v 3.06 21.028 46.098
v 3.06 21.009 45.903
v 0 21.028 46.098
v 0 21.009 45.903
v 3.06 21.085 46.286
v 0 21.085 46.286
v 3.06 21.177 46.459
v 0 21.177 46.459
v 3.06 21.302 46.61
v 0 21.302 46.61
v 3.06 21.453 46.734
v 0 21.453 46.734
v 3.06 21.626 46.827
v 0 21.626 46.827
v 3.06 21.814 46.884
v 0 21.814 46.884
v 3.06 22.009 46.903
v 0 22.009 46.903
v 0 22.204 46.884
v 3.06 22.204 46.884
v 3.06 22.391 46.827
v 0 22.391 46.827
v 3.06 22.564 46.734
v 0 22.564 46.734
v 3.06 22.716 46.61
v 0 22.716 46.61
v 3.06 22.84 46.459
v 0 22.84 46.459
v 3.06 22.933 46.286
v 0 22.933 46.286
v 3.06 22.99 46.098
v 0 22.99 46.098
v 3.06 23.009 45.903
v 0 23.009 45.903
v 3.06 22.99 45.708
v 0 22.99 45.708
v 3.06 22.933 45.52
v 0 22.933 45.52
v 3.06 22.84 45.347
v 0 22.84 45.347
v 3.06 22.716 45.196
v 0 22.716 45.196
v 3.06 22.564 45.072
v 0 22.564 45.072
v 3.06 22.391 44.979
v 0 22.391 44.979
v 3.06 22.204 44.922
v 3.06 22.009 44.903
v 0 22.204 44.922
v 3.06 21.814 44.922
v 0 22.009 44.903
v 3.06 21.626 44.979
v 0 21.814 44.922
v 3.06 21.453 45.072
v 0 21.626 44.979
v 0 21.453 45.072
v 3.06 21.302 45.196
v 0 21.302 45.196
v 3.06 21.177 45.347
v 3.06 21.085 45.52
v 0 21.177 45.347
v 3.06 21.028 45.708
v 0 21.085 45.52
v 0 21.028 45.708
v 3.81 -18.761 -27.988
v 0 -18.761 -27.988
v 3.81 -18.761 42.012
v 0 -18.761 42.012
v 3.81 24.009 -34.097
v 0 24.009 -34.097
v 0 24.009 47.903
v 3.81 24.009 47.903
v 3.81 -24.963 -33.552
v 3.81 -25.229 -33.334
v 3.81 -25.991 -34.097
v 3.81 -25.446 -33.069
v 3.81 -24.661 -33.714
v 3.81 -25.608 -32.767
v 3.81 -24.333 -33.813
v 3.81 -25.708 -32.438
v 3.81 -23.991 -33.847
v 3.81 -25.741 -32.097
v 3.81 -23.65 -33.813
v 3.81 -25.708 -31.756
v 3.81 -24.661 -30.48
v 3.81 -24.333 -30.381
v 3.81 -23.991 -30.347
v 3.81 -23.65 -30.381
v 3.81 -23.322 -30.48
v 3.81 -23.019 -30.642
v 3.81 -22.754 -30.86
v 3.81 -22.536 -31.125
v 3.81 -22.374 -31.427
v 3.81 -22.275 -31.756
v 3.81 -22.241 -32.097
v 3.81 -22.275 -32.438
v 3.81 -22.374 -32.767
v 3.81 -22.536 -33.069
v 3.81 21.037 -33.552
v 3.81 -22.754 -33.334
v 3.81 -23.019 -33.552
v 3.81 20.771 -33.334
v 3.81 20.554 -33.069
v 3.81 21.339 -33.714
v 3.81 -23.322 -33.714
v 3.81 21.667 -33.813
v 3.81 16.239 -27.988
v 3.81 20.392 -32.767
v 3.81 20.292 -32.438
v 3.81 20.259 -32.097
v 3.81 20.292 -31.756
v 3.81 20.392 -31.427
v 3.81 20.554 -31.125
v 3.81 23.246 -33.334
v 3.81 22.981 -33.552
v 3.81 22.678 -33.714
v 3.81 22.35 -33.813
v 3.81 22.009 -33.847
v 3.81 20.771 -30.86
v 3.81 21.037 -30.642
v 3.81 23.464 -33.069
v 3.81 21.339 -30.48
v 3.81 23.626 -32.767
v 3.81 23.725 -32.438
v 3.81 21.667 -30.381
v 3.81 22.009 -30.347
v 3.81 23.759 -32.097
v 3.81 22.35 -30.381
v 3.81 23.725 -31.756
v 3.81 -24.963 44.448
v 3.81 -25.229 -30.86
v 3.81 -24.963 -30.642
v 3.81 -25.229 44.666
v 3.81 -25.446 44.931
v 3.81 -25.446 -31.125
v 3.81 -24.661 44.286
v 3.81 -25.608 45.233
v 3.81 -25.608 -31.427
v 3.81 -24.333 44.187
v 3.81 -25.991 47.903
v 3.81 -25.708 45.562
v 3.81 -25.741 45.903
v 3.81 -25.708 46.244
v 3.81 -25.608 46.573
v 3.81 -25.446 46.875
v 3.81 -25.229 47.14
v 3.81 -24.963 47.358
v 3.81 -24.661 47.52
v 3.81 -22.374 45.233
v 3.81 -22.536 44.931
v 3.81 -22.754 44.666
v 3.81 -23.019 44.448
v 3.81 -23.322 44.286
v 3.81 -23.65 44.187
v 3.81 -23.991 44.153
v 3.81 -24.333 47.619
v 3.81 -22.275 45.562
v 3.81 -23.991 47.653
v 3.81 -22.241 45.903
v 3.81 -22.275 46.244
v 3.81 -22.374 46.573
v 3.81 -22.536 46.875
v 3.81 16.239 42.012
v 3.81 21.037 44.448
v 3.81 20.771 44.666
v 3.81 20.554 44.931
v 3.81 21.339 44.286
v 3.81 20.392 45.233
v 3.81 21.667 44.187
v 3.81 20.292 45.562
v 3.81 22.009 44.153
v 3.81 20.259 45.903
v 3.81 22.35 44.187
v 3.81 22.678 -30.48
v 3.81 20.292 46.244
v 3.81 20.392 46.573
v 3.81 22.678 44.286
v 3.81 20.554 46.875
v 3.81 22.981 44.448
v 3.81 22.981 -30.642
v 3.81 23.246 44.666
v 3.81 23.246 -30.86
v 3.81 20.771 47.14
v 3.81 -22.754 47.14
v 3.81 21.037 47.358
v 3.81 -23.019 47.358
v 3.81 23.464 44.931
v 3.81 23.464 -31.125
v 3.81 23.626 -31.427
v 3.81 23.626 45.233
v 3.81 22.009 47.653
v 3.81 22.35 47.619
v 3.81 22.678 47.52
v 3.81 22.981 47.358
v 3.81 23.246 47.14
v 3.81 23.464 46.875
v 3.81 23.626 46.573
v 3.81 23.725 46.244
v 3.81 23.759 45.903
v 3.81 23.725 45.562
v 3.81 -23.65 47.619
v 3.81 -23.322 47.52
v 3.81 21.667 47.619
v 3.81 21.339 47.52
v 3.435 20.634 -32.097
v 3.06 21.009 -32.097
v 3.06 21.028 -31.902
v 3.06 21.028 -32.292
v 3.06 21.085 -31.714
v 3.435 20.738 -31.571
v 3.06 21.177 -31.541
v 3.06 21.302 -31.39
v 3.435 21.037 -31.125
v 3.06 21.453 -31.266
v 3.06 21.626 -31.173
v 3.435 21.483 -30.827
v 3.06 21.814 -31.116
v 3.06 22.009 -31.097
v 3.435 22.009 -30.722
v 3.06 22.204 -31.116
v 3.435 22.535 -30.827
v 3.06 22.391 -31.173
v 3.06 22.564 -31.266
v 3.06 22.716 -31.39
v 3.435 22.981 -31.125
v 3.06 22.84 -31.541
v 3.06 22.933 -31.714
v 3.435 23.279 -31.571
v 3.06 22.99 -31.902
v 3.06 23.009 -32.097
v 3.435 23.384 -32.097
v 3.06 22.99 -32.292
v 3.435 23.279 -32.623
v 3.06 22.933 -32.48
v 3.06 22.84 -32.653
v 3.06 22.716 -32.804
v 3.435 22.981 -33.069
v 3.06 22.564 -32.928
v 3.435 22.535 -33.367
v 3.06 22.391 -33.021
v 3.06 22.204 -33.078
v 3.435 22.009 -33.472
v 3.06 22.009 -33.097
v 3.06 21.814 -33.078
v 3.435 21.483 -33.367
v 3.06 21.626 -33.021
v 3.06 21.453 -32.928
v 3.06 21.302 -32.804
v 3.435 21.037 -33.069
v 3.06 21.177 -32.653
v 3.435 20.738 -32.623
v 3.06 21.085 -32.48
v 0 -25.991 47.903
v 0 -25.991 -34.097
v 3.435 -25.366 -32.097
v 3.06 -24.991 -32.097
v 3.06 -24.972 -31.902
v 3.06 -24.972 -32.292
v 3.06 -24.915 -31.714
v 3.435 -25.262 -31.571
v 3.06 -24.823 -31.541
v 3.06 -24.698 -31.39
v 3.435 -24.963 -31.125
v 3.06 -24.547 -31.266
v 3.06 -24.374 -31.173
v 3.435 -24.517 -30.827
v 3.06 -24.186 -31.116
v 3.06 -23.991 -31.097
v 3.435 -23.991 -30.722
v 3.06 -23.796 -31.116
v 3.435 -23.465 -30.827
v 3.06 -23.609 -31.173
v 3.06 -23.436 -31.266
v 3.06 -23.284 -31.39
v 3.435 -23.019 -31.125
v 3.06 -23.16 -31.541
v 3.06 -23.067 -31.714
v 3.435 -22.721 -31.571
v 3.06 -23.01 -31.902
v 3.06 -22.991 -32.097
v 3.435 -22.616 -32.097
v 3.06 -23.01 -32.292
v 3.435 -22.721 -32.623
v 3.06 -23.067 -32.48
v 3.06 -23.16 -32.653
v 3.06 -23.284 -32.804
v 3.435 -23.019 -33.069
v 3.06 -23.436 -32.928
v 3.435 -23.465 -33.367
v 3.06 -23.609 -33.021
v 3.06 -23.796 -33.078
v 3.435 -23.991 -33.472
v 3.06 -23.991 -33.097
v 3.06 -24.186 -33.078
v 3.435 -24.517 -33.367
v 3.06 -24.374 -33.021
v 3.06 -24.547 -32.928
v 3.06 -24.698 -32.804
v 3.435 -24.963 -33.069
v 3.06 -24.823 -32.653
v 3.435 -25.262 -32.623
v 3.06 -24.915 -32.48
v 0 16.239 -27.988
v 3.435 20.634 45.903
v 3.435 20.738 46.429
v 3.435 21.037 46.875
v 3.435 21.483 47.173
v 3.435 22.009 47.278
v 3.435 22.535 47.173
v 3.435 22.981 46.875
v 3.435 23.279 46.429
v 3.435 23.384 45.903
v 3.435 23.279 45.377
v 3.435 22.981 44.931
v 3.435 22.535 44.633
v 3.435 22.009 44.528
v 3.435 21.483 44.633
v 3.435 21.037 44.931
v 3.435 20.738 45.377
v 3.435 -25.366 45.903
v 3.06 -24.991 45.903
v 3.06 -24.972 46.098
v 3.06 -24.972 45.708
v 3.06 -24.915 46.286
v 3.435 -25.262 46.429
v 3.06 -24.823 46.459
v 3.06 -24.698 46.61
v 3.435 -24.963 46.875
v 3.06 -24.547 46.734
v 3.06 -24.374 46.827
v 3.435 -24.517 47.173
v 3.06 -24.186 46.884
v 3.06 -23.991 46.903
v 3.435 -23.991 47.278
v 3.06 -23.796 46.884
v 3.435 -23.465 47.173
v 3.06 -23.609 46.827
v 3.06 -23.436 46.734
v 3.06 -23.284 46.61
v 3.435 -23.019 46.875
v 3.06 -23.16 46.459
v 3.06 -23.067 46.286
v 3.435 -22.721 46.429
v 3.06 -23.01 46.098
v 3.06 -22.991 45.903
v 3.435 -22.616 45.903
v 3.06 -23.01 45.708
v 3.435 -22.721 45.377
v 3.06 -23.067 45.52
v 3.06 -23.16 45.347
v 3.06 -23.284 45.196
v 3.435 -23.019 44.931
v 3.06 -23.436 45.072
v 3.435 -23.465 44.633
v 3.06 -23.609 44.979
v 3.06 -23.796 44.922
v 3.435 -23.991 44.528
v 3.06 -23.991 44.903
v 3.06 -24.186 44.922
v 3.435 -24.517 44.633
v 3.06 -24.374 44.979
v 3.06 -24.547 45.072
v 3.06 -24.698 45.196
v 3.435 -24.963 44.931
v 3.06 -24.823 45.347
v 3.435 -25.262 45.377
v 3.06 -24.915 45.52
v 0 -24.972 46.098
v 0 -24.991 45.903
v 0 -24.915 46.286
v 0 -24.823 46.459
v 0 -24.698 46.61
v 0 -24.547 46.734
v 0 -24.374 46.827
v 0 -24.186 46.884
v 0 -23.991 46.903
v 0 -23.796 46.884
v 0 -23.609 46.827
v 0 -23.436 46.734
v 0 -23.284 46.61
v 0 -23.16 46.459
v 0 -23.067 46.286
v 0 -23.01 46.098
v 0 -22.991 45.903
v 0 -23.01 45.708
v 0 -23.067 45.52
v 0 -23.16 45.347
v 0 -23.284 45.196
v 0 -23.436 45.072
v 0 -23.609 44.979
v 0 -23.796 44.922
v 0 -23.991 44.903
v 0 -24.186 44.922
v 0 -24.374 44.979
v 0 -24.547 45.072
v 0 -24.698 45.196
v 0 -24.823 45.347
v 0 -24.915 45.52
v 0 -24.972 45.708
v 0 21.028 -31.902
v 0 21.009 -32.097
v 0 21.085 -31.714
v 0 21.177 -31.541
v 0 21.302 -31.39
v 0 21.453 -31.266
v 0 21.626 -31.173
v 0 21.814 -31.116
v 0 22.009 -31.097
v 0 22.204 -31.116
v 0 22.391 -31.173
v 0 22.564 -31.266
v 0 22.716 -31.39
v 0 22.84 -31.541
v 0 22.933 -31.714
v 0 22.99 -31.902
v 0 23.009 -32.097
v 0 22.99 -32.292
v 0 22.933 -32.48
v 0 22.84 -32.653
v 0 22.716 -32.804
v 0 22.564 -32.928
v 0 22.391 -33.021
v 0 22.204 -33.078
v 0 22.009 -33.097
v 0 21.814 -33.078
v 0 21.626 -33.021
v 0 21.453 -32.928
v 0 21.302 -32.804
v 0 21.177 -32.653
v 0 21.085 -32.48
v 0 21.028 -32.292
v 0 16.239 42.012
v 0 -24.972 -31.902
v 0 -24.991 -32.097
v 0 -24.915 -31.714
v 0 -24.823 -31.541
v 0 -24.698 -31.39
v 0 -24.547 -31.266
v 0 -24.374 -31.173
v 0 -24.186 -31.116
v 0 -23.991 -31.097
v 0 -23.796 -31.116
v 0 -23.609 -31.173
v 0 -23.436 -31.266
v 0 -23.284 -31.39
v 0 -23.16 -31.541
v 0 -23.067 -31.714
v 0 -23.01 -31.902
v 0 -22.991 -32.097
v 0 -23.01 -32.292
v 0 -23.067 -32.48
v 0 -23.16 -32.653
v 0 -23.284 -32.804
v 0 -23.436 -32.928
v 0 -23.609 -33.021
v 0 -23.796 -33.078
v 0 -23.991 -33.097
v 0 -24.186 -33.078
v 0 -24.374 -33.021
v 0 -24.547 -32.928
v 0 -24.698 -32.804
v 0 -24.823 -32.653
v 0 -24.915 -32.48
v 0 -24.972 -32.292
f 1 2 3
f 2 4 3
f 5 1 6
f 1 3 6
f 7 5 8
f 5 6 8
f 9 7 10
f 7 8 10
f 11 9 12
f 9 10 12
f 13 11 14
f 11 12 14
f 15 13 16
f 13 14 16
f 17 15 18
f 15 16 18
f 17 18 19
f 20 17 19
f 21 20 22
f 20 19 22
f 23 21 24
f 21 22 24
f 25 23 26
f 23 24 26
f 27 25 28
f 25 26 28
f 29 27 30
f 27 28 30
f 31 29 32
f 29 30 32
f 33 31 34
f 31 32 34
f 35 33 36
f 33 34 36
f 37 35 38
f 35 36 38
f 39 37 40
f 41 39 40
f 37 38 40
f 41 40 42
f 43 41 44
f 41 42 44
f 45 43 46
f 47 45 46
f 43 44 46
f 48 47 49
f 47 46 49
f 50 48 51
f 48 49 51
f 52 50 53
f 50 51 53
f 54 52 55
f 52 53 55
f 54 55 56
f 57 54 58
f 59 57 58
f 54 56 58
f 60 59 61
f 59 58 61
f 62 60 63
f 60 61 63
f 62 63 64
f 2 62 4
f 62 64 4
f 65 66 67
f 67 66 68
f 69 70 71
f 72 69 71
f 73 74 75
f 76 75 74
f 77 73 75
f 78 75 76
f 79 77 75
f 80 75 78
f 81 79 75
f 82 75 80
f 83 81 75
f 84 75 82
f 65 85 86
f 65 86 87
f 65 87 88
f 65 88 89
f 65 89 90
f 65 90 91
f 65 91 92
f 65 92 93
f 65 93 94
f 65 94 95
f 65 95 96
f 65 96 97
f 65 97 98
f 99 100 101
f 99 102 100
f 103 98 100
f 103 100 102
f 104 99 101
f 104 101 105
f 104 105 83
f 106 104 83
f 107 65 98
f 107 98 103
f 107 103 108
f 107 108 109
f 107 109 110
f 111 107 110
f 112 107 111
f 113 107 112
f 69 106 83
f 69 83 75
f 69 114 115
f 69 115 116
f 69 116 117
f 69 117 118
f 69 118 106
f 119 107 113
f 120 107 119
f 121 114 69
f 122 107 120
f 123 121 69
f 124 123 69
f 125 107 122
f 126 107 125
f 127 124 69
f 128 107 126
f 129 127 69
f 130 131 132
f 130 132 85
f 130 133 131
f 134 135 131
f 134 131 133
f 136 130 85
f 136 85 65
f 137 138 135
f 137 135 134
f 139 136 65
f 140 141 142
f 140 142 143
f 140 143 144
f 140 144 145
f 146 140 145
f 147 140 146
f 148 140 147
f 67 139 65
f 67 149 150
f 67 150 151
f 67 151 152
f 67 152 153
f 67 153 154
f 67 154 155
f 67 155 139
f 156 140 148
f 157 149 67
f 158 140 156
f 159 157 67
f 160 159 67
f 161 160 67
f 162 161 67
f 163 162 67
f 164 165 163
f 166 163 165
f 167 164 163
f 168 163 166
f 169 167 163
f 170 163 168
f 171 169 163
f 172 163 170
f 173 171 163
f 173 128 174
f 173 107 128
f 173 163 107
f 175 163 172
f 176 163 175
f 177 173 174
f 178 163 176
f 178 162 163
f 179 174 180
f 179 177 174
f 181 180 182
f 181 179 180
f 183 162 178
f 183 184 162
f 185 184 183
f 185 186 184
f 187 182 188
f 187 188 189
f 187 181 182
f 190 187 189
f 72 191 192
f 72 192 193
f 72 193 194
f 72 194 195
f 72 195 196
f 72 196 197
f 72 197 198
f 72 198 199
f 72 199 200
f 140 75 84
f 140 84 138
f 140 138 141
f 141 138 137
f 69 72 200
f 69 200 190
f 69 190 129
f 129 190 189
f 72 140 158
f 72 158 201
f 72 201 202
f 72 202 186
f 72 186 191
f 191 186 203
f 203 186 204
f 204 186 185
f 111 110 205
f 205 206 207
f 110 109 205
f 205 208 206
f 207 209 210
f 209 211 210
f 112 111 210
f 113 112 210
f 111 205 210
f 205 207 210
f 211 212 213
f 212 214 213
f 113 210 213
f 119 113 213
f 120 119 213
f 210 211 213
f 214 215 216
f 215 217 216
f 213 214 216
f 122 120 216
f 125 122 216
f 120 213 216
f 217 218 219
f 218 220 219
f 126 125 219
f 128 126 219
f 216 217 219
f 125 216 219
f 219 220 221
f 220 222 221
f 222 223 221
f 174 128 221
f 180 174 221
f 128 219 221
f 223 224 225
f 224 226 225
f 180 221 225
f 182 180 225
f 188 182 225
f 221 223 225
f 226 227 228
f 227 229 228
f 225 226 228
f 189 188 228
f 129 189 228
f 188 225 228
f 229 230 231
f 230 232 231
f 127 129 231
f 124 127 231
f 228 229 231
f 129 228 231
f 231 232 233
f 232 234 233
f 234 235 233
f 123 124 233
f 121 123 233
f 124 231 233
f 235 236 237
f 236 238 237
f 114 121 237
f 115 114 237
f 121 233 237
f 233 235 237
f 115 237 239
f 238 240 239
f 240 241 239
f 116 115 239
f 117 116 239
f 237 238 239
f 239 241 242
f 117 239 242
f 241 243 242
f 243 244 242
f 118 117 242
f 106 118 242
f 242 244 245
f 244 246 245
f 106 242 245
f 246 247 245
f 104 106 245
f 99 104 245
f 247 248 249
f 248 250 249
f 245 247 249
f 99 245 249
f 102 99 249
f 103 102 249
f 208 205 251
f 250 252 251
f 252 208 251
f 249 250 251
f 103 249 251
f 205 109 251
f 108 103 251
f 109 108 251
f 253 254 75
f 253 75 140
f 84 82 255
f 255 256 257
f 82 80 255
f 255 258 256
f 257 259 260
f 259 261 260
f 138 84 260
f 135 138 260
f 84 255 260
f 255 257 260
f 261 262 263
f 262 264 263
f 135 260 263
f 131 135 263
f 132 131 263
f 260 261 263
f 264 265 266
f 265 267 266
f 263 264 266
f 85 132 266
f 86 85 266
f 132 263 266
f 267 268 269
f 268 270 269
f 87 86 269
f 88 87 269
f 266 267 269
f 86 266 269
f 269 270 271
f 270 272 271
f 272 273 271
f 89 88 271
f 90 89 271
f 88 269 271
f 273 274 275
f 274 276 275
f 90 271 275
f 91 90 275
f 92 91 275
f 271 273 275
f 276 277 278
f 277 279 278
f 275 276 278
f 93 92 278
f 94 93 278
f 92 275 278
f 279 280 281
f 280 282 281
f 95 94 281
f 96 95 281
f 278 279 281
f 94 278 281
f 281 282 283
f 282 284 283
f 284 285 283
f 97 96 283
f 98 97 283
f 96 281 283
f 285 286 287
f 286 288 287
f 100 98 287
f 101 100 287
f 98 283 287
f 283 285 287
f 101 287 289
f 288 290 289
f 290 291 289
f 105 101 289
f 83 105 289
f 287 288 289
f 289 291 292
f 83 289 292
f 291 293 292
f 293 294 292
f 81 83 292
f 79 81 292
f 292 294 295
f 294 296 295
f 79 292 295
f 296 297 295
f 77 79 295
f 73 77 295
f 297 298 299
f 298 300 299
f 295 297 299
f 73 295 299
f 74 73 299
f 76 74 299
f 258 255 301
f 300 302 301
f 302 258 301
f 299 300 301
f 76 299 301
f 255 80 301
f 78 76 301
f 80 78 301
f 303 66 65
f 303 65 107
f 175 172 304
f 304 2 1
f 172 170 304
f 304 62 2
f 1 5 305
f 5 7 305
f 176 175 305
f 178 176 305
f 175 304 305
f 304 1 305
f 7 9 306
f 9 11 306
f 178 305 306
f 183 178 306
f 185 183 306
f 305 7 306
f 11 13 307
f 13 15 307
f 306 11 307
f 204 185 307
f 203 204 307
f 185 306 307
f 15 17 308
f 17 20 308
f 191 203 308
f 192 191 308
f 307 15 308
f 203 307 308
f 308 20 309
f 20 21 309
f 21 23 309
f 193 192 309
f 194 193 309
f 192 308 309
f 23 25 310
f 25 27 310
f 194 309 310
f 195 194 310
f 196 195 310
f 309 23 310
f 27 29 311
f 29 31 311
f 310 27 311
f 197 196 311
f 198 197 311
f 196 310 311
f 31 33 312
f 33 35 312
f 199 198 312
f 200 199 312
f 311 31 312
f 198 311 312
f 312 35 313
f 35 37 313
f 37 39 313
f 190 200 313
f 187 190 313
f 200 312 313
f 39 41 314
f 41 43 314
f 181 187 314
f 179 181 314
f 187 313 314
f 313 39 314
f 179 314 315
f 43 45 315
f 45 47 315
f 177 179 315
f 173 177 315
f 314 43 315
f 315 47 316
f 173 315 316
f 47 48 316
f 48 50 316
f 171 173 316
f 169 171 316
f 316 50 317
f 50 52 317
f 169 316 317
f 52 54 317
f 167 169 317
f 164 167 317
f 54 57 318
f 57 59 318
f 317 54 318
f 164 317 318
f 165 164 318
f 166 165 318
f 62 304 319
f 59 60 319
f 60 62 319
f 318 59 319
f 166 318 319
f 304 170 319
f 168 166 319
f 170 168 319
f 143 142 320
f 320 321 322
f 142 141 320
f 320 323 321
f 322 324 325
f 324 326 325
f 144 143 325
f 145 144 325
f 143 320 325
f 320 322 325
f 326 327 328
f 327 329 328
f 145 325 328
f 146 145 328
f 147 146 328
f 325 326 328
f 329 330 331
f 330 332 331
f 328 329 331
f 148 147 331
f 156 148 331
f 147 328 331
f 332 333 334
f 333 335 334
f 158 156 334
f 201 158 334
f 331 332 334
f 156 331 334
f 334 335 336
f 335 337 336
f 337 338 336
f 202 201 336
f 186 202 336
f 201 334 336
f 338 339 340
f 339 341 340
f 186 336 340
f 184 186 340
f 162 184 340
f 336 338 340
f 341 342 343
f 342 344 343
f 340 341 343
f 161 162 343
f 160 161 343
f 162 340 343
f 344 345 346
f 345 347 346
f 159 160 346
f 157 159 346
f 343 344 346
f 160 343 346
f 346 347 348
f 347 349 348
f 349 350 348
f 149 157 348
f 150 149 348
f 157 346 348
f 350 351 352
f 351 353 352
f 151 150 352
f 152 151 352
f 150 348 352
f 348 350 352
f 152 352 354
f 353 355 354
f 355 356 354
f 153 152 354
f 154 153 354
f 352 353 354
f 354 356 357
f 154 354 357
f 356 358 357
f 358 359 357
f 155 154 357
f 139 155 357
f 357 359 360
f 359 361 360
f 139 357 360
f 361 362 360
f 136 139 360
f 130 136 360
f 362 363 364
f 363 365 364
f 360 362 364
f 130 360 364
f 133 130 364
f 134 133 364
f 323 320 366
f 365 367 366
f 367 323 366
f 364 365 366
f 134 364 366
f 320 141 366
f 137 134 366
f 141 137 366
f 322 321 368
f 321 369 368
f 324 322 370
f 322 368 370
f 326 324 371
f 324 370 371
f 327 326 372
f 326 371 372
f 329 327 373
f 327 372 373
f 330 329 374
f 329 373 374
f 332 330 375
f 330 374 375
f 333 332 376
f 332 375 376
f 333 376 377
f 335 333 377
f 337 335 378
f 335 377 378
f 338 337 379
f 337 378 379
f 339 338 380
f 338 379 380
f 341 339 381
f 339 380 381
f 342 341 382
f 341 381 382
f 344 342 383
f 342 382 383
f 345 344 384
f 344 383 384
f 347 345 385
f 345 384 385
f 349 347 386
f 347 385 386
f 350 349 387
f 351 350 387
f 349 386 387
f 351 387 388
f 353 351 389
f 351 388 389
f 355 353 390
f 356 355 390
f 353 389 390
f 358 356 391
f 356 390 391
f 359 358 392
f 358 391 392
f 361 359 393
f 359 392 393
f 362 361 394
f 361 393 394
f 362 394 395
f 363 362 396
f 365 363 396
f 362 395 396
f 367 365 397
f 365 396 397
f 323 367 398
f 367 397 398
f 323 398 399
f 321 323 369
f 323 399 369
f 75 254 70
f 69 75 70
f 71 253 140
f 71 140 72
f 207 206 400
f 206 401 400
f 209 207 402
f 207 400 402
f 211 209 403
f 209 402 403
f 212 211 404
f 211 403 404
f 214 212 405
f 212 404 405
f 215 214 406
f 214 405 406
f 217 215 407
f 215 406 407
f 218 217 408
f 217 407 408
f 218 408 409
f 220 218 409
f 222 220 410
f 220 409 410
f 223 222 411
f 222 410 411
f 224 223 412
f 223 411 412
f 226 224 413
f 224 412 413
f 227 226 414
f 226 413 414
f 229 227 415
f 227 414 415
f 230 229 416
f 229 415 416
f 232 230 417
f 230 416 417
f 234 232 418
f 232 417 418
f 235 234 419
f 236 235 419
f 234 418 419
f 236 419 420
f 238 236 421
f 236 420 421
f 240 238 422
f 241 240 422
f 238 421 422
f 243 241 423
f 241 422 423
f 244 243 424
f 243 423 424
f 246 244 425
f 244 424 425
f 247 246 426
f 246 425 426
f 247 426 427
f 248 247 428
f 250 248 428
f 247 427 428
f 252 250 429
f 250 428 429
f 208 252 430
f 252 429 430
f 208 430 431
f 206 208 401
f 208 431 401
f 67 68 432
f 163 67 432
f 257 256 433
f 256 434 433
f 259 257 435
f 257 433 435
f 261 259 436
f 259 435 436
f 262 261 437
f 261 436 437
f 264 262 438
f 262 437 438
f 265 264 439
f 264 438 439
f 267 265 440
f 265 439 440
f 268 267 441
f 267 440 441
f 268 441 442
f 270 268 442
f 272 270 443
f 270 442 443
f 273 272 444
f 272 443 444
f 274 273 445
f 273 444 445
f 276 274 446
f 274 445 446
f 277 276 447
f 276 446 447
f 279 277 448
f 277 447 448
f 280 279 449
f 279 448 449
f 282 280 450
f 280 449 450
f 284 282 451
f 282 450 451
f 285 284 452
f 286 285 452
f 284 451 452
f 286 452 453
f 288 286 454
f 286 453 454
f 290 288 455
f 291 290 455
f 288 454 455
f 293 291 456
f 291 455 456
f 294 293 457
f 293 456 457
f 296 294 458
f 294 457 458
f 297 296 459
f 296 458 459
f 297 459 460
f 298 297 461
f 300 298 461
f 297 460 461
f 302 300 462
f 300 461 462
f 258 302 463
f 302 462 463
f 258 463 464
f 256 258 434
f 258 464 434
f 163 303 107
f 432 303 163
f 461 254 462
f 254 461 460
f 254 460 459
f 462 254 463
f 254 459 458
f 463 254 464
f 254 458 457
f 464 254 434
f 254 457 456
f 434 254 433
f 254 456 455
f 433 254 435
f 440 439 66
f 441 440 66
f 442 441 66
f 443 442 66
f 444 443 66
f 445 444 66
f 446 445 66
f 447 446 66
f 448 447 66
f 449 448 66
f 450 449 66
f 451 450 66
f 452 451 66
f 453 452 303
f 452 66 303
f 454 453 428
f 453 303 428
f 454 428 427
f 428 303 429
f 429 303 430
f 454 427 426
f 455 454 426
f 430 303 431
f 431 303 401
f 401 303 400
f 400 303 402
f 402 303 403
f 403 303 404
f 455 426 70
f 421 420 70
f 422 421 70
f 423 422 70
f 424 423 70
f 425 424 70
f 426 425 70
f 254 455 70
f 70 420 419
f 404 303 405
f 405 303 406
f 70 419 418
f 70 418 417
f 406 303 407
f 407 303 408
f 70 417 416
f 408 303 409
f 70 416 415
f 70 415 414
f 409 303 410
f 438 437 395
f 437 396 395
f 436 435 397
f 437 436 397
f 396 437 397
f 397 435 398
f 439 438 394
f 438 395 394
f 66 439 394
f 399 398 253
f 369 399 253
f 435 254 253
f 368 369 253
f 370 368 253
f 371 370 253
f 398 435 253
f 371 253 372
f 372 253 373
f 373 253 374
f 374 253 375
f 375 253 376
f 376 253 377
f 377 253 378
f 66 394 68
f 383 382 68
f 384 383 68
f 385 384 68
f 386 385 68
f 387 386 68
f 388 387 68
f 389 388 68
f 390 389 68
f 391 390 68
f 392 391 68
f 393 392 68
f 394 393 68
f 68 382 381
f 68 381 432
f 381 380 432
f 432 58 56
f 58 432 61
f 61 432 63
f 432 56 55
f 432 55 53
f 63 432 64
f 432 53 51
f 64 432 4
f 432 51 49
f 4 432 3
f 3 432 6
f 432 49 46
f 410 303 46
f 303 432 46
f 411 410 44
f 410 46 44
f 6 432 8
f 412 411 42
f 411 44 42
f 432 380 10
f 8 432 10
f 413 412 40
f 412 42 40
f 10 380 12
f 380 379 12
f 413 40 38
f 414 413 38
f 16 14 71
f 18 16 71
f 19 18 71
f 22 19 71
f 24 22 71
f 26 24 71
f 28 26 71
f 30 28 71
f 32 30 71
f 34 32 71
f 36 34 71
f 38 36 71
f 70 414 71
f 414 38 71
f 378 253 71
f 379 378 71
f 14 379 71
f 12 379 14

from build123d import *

# Parameters (mm, degrees)
F0_W           = 50
F0_H           = 82
F0_W_2         = 35
F0_H_2         = 70
F1_DEPTH       = 3.81
F3_D           = 2
F3_DEPTH       = 50.8
F3_CSINK_D     = 3.5
F3_CSINK_ANGLE = 90


with BuildPart() as f1:
    # F0 (on Right) → F1 (new body)
    with BuildSketch(Plane.YZ):
        with Locations((-0.991207, 6.902988)):
            Rectangle(F0_W, F0_H)
        with Locations((-1.261404, 7.01166)):
            Rectangle(F0_W_2, F0_H_2, mode=Mode.SUBTRACT)
    extrude(amount=F1_DEPTH)

    # F3
    with Locations(Plane.YZ.offset(3.81)):
        with Locations((-23.991207, 45.902988), (22.008793, 45.902988), (22.008793, -32.097012), (-23.991207, -32.097012)):
            CounterSinkHole(F3_D / 2, F3_CSINK_D / 2, depth=F3_DEPTH, counter_sink_angle=F3_CSINK_ANGLE)


solid = f1.part
